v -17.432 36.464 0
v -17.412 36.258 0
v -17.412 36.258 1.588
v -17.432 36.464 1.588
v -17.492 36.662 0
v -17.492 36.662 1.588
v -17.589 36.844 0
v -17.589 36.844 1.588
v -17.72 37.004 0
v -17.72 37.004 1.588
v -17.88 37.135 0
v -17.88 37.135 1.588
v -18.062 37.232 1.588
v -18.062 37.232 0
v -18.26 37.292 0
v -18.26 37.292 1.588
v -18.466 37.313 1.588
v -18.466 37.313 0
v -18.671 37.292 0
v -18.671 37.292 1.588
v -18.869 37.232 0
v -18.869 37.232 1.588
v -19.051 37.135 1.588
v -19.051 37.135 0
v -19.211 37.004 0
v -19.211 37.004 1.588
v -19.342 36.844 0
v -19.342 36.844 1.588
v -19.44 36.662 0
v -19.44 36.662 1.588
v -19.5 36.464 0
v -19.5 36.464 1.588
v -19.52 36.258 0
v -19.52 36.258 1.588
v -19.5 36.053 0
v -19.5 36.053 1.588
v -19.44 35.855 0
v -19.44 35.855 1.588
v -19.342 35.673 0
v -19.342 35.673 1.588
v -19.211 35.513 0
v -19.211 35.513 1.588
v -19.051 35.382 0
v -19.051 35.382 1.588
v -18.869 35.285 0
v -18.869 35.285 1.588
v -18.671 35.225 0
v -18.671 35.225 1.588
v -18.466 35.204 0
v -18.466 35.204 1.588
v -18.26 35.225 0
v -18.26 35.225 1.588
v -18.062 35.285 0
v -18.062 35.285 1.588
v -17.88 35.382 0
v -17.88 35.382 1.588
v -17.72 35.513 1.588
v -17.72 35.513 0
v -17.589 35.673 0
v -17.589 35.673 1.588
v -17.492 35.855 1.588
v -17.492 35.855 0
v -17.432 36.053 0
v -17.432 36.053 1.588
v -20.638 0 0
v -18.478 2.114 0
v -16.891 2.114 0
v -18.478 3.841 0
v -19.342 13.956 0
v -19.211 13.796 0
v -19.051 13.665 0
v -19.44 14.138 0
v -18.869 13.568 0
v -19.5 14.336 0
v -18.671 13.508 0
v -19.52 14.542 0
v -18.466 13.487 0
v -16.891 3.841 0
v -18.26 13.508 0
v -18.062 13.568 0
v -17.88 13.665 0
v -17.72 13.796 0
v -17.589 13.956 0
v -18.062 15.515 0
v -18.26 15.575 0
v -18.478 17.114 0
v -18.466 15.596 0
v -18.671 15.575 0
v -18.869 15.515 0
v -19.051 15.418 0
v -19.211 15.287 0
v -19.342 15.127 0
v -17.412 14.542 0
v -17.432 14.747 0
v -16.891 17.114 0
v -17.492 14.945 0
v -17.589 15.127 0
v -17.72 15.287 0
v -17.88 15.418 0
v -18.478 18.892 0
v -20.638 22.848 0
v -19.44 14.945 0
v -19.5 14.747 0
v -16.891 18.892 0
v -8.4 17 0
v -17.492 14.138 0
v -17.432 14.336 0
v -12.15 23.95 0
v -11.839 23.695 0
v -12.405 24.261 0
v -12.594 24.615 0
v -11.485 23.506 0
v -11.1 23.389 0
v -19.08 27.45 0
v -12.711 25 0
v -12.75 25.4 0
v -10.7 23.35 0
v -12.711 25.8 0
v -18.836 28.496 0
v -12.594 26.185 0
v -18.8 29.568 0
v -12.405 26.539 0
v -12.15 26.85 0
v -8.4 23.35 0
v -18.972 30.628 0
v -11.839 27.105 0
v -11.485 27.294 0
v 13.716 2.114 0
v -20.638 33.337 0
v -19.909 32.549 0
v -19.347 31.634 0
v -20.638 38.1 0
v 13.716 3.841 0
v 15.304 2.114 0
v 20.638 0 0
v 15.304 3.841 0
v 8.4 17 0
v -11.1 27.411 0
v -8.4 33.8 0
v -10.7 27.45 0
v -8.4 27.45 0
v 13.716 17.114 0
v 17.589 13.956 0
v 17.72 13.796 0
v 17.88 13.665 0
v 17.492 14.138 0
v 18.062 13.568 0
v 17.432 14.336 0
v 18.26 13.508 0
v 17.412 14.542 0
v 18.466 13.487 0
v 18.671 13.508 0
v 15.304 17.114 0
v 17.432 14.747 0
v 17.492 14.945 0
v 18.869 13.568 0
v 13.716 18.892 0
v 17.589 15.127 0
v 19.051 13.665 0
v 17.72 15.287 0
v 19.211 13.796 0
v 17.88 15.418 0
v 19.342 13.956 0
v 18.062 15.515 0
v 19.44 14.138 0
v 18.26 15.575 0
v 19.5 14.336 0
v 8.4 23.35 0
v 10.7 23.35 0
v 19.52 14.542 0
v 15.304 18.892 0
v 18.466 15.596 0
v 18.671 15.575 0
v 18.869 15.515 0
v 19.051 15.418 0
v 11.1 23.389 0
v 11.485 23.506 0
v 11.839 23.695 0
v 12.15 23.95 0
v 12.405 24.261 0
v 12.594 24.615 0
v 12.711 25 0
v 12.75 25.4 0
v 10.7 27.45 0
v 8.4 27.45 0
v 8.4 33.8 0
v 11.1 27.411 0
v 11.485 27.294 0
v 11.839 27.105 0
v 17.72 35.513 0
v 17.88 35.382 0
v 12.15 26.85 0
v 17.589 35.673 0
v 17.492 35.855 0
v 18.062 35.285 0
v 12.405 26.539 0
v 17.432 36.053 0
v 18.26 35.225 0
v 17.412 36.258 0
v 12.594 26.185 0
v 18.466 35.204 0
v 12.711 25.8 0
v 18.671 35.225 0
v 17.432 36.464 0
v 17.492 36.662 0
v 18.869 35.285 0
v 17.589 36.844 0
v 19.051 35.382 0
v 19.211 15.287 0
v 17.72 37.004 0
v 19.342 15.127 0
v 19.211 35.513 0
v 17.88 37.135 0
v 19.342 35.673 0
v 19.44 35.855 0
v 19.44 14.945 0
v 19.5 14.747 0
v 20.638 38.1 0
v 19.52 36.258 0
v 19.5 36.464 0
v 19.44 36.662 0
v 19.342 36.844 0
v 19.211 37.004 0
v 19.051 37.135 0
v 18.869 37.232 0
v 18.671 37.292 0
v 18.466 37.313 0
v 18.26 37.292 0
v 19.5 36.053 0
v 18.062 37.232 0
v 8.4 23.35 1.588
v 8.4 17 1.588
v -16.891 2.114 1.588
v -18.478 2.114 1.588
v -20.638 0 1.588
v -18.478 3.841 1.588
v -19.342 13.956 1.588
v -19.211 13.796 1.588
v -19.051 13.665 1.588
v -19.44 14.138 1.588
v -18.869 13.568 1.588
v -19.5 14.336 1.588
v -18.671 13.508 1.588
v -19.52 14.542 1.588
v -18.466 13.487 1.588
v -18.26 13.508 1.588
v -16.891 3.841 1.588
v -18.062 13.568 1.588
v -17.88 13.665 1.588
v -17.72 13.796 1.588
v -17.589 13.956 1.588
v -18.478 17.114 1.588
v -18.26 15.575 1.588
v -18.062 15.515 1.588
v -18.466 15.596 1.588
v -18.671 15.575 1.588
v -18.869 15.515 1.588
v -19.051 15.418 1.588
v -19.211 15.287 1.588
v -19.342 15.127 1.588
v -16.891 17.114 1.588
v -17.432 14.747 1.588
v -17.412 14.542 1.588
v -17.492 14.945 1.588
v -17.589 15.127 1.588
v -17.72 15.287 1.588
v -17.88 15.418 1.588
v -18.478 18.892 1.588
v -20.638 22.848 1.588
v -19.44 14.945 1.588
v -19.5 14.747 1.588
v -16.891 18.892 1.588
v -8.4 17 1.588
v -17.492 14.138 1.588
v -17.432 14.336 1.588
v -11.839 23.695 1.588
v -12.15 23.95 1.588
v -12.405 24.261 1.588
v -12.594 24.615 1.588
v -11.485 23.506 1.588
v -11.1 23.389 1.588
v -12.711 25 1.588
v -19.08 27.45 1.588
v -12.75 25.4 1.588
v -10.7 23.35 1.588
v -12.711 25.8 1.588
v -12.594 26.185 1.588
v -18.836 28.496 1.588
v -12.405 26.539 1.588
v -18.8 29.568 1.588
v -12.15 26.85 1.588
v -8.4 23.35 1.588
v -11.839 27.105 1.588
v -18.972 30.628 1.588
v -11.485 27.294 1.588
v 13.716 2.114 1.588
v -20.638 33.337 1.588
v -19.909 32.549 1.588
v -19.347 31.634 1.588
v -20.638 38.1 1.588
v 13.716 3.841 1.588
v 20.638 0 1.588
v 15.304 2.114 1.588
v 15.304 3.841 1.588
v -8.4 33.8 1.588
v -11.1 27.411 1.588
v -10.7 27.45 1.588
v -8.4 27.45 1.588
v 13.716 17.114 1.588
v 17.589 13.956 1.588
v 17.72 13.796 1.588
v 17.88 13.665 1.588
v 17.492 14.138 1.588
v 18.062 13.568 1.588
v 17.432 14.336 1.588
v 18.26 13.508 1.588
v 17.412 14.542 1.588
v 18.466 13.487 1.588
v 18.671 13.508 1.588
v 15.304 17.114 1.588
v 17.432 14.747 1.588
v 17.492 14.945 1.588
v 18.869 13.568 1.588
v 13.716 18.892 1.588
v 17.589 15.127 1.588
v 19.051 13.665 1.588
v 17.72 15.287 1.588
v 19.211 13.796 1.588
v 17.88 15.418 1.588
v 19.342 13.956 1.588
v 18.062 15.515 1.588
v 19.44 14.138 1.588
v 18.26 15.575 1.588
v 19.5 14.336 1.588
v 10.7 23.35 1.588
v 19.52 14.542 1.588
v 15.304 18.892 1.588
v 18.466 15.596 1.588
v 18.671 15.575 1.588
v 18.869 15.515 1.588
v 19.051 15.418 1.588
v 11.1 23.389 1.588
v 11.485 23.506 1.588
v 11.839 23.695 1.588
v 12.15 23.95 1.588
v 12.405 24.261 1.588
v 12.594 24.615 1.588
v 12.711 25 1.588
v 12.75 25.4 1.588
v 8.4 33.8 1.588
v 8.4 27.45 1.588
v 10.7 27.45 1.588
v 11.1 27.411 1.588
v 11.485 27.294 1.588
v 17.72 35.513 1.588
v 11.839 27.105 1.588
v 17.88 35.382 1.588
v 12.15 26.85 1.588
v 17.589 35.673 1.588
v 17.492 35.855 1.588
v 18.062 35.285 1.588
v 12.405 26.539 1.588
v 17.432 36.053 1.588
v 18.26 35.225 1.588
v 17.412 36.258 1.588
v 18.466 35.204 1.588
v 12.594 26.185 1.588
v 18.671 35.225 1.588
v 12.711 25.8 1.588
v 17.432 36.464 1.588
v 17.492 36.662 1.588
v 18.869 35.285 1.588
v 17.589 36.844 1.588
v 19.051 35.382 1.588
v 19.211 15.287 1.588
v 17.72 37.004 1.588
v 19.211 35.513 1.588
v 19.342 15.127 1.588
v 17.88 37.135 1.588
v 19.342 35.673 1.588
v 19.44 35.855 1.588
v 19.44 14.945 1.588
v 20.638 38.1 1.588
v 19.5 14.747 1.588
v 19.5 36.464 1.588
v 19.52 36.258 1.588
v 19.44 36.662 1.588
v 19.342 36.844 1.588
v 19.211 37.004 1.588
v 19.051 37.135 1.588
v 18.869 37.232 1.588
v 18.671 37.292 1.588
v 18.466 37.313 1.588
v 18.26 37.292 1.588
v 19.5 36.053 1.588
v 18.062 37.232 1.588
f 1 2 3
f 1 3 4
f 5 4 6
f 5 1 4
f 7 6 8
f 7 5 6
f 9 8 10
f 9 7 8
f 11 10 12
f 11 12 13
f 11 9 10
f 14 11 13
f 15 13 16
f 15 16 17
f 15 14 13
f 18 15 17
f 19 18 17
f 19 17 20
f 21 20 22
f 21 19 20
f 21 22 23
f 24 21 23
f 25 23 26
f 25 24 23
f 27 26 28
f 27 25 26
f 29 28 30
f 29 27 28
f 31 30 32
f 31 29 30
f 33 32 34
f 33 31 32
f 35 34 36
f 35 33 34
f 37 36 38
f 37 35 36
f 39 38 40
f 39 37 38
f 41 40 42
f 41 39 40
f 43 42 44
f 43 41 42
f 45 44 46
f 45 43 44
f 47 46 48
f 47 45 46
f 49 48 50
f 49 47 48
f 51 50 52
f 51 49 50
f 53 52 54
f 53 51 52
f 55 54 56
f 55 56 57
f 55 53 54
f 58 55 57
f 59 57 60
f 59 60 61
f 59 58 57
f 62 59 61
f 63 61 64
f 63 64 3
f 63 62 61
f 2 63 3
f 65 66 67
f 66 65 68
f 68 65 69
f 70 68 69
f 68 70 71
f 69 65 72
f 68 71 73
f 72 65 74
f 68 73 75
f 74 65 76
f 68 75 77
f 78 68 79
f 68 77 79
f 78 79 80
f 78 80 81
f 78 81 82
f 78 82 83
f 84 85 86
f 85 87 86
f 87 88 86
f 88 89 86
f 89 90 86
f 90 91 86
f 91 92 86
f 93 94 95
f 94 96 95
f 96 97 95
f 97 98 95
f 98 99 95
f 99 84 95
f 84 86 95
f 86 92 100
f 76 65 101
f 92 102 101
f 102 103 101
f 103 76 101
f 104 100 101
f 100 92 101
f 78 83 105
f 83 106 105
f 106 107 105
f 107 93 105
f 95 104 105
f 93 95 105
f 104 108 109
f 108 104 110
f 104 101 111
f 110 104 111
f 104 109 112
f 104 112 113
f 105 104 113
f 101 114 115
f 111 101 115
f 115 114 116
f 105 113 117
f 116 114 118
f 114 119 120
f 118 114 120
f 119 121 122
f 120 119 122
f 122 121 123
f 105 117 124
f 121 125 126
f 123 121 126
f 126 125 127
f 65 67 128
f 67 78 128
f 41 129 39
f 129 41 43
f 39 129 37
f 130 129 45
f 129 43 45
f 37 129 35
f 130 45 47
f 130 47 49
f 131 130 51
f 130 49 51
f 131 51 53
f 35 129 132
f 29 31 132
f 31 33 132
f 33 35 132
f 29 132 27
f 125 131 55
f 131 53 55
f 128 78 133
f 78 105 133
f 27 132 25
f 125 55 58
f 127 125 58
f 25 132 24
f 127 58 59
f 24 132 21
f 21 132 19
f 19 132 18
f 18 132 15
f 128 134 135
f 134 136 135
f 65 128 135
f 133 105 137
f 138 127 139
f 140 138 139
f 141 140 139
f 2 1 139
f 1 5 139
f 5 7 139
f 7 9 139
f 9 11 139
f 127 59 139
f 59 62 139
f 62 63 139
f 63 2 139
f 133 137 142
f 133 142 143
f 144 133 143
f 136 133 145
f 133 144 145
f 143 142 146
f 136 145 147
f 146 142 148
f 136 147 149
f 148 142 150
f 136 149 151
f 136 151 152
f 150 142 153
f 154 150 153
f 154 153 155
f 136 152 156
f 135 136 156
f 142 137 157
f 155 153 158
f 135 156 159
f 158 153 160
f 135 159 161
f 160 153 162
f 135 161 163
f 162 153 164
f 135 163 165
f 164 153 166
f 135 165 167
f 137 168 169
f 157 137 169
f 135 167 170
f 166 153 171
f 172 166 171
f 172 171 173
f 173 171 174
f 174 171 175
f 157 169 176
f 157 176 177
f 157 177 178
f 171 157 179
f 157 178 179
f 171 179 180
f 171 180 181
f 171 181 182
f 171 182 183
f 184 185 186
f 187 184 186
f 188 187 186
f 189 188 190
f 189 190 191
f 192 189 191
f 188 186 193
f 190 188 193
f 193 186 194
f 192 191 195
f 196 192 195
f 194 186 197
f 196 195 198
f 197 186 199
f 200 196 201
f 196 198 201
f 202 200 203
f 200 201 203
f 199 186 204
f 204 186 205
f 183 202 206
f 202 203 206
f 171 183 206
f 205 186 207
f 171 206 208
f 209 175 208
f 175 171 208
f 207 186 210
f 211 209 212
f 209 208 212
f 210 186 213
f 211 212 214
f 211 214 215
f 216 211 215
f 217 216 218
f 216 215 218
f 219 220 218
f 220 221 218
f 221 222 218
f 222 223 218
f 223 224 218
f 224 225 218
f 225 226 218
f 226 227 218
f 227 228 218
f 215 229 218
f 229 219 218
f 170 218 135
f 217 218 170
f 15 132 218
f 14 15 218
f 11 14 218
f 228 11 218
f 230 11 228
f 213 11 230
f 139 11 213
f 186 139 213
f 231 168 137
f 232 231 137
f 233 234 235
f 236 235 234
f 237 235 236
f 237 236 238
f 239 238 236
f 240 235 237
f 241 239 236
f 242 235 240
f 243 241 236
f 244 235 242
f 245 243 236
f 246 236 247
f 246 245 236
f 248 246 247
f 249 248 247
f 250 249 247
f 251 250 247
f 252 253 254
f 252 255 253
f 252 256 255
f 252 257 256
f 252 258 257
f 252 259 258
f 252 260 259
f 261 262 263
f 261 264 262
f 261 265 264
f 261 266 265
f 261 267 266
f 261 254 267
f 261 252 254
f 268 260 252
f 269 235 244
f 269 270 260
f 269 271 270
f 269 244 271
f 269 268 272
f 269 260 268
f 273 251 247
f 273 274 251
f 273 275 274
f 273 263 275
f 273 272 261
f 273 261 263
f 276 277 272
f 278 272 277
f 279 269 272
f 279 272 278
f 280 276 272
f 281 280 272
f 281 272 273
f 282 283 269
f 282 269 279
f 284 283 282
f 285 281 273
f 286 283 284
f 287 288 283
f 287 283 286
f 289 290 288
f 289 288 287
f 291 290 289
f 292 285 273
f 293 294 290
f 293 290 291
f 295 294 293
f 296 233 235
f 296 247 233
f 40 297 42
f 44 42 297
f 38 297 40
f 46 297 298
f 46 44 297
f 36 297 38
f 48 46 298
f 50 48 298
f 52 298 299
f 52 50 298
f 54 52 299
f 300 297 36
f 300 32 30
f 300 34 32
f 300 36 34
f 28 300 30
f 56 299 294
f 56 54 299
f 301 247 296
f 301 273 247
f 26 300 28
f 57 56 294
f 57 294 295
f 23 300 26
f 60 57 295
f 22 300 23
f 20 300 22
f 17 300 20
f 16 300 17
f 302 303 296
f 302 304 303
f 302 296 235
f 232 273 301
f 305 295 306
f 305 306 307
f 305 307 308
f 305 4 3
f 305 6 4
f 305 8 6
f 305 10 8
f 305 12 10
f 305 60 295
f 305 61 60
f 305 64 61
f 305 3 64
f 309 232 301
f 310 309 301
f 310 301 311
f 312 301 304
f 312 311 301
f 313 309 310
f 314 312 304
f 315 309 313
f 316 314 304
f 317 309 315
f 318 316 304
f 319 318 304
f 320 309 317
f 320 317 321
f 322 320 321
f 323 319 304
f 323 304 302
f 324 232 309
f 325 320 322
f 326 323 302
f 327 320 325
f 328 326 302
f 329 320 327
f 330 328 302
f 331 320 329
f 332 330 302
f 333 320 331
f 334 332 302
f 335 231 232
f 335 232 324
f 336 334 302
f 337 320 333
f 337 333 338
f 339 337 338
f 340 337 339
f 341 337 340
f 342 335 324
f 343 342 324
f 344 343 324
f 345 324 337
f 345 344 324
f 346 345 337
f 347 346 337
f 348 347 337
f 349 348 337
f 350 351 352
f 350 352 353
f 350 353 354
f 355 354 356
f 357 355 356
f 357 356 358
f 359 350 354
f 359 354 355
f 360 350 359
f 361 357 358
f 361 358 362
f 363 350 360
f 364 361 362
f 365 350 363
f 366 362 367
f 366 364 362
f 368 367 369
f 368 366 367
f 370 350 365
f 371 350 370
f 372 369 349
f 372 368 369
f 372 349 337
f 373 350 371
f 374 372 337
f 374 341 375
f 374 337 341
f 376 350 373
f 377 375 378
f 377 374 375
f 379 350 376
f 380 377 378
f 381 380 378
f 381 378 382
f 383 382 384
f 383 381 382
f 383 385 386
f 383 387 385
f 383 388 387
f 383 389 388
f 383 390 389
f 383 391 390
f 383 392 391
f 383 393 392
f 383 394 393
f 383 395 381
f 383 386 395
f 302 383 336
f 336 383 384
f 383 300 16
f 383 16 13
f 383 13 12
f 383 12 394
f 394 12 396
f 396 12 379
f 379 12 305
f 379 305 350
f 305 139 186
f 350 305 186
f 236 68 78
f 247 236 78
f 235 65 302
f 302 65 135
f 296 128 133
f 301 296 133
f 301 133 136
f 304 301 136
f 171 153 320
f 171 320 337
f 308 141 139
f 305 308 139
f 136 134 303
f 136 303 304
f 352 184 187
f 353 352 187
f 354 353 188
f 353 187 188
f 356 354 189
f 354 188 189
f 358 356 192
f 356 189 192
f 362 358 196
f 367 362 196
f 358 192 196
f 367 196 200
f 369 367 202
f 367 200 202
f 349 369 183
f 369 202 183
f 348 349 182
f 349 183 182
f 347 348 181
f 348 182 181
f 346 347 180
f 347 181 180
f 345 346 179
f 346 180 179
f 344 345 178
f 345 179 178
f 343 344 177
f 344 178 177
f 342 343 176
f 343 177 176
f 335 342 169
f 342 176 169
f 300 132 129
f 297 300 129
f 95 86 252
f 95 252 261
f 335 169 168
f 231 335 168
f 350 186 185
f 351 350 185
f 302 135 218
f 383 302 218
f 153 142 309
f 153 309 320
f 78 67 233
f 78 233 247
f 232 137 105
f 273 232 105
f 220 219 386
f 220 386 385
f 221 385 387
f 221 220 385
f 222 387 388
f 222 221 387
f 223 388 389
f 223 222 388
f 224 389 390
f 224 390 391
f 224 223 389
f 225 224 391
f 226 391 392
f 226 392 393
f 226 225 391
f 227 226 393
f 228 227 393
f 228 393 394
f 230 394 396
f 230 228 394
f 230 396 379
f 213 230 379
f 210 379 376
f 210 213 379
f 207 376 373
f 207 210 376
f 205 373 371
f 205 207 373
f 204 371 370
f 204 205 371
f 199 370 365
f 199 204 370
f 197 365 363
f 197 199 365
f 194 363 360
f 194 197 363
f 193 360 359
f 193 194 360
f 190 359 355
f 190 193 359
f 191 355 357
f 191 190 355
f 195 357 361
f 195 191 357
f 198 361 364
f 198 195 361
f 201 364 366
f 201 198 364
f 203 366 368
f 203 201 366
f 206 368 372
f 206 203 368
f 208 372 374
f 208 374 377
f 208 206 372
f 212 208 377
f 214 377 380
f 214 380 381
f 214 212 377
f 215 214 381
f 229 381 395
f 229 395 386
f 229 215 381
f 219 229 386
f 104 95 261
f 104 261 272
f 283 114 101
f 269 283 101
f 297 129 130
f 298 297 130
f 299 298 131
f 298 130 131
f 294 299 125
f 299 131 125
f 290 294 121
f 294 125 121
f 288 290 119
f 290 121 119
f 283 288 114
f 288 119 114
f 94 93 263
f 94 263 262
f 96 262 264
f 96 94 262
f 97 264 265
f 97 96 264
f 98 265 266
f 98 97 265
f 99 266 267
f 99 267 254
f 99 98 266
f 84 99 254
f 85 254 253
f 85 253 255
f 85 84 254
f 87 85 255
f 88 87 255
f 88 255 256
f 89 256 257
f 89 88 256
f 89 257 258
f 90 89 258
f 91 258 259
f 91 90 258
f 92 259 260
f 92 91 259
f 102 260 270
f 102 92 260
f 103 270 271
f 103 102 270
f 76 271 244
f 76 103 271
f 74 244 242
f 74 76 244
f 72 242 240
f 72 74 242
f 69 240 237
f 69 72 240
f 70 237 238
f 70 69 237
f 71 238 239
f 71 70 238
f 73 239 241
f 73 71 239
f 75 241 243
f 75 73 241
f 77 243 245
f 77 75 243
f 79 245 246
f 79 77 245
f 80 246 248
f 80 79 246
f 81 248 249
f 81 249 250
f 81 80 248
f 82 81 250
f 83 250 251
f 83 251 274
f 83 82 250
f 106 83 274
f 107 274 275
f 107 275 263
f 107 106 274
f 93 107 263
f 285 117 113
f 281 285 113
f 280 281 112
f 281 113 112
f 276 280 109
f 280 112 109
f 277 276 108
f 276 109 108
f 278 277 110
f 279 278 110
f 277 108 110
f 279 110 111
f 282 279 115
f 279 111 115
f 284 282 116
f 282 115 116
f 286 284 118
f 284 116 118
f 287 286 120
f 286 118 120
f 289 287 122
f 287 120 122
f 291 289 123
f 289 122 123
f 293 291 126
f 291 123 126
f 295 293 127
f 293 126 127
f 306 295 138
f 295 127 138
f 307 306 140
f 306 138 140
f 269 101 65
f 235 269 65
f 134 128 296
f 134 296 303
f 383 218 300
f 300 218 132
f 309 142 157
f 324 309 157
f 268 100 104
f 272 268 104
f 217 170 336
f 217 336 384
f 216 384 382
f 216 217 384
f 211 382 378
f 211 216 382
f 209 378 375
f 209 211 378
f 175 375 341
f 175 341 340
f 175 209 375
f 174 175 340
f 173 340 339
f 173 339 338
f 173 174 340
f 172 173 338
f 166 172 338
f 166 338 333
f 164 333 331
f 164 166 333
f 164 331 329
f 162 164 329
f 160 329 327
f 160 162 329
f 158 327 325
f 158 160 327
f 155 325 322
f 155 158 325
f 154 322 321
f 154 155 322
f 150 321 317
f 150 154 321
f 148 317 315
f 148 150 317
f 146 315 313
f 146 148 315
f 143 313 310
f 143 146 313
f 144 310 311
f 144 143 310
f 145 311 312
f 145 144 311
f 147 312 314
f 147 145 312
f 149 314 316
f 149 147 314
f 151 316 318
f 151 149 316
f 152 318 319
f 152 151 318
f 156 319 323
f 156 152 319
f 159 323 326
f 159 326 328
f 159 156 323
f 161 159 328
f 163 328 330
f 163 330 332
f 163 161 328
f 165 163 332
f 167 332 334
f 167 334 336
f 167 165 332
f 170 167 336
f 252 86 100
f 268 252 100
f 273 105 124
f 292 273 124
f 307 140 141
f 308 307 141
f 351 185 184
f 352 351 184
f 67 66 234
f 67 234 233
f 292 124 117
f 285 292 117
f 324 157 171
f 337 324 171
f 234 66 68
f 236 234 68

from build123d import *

# Parameters (mm, degrees)
SKETCH1_W           = 1.5875
SKETCH1_H           = 1.7272
SKETCH1_R           = 1.0541
SKETCH1_H_2         = 1.778
BOSS_EXTRUDE1_DEPTH = 1.5875


with BuildPart() as part:
    # Sketch1 → Boss-Extrude1 (new body)
    with BuildSketch(Plane.XY):
        with BuildLine():
            Line((-20.6375, 22.848075056), (-20.6375, 0))
            Line((-20.6375, 0), (20.6375, 0))
            Line((20.6375, 0), (20.6375, 38.1))
            Line((20.6375, 38.1), (-20.6375, 38.1))
            Line((-20.6375, 38.1), (-20.6375, 33.337040193))
            ThreePointArc((-20.6375, 33.337040193), (-18.972227818, 30.628064614), (-19.079863508, 27.45))
            Line((-19.079863508, 27.45), (-20.6375, 22.848075056))
        make_face()
        with Locations((-17.68475, 2.977543878)):
            Rectangle(SKETCH1_W, SKETCH1_H, mode=Mode.SUBTRACT)
        with Locations((-18.4658, 14.5415)):
            Circle(SKETCH1_R, mode=Mode.SUBTRACT)
        with Locations((-17.68475, 18.002943878)):
            Rectangle(SKETCH1_W, SKETCH1_H_2, mode=Mode.SUBTRACT)
        with Locations((14.50975, 2.977543878)):
            Rectangle(SKETCH1_W, SKETCH1_H, mode=Mode.SUBTRACT)
        with Locations((14.50975, 18.002943878)):
            Rectangle(SKETCH1_W, SKETCH1_H_2, mode=Mode.SUBTRACT)
        with Locations((18.4658, 14.5415)):
            Circle(SKETCH1_R, mode=Mode.SUBTRACT)
        with BuildLine():
            Line((-8.4, 17), (-8.4, 23.35))
            Line((-8.4, 23.35), (-10.7, 23.35))
            ThreePointArc((-10.7, 23.35), (-12.75, 25.4), (-10.7, 27.45))
            Line((-10.7, 27.45), (-8.4, 27.45))
            Line((-8.4, 27.45), (-8.4, 33.8))
            Line((-8.4, 33.8), (8.4, 33.8))
            Line((8.4, 33.8), (8.4, 27.45))
            Line((8.4, 27.45), (10.7, 27.45))
            ThreePointArc((10.7, 27.45), (12.75, 25.4), (10.7, 23.35))
            Line((10.7, 23.35), (8.4, 23.35))
            Line((8.4, 23.35), (8.4, 17))
            Line((8.4, 17), (-8.4, 17))
        make_face(mode=Mode.SUBTRACT)
        with Locations((-18.4658, 36.2585)):
            Circle(SKETCH1_R, mode=Mode.SUBTRACT)
        with Locations((18.4658, 36.2585)):
            Circle(SKETCH1_R, mode=Mode.SUBTRACT)
    extrude(amount=BOSS_EXTRUDE1_DEPTH)


solid = part.part
